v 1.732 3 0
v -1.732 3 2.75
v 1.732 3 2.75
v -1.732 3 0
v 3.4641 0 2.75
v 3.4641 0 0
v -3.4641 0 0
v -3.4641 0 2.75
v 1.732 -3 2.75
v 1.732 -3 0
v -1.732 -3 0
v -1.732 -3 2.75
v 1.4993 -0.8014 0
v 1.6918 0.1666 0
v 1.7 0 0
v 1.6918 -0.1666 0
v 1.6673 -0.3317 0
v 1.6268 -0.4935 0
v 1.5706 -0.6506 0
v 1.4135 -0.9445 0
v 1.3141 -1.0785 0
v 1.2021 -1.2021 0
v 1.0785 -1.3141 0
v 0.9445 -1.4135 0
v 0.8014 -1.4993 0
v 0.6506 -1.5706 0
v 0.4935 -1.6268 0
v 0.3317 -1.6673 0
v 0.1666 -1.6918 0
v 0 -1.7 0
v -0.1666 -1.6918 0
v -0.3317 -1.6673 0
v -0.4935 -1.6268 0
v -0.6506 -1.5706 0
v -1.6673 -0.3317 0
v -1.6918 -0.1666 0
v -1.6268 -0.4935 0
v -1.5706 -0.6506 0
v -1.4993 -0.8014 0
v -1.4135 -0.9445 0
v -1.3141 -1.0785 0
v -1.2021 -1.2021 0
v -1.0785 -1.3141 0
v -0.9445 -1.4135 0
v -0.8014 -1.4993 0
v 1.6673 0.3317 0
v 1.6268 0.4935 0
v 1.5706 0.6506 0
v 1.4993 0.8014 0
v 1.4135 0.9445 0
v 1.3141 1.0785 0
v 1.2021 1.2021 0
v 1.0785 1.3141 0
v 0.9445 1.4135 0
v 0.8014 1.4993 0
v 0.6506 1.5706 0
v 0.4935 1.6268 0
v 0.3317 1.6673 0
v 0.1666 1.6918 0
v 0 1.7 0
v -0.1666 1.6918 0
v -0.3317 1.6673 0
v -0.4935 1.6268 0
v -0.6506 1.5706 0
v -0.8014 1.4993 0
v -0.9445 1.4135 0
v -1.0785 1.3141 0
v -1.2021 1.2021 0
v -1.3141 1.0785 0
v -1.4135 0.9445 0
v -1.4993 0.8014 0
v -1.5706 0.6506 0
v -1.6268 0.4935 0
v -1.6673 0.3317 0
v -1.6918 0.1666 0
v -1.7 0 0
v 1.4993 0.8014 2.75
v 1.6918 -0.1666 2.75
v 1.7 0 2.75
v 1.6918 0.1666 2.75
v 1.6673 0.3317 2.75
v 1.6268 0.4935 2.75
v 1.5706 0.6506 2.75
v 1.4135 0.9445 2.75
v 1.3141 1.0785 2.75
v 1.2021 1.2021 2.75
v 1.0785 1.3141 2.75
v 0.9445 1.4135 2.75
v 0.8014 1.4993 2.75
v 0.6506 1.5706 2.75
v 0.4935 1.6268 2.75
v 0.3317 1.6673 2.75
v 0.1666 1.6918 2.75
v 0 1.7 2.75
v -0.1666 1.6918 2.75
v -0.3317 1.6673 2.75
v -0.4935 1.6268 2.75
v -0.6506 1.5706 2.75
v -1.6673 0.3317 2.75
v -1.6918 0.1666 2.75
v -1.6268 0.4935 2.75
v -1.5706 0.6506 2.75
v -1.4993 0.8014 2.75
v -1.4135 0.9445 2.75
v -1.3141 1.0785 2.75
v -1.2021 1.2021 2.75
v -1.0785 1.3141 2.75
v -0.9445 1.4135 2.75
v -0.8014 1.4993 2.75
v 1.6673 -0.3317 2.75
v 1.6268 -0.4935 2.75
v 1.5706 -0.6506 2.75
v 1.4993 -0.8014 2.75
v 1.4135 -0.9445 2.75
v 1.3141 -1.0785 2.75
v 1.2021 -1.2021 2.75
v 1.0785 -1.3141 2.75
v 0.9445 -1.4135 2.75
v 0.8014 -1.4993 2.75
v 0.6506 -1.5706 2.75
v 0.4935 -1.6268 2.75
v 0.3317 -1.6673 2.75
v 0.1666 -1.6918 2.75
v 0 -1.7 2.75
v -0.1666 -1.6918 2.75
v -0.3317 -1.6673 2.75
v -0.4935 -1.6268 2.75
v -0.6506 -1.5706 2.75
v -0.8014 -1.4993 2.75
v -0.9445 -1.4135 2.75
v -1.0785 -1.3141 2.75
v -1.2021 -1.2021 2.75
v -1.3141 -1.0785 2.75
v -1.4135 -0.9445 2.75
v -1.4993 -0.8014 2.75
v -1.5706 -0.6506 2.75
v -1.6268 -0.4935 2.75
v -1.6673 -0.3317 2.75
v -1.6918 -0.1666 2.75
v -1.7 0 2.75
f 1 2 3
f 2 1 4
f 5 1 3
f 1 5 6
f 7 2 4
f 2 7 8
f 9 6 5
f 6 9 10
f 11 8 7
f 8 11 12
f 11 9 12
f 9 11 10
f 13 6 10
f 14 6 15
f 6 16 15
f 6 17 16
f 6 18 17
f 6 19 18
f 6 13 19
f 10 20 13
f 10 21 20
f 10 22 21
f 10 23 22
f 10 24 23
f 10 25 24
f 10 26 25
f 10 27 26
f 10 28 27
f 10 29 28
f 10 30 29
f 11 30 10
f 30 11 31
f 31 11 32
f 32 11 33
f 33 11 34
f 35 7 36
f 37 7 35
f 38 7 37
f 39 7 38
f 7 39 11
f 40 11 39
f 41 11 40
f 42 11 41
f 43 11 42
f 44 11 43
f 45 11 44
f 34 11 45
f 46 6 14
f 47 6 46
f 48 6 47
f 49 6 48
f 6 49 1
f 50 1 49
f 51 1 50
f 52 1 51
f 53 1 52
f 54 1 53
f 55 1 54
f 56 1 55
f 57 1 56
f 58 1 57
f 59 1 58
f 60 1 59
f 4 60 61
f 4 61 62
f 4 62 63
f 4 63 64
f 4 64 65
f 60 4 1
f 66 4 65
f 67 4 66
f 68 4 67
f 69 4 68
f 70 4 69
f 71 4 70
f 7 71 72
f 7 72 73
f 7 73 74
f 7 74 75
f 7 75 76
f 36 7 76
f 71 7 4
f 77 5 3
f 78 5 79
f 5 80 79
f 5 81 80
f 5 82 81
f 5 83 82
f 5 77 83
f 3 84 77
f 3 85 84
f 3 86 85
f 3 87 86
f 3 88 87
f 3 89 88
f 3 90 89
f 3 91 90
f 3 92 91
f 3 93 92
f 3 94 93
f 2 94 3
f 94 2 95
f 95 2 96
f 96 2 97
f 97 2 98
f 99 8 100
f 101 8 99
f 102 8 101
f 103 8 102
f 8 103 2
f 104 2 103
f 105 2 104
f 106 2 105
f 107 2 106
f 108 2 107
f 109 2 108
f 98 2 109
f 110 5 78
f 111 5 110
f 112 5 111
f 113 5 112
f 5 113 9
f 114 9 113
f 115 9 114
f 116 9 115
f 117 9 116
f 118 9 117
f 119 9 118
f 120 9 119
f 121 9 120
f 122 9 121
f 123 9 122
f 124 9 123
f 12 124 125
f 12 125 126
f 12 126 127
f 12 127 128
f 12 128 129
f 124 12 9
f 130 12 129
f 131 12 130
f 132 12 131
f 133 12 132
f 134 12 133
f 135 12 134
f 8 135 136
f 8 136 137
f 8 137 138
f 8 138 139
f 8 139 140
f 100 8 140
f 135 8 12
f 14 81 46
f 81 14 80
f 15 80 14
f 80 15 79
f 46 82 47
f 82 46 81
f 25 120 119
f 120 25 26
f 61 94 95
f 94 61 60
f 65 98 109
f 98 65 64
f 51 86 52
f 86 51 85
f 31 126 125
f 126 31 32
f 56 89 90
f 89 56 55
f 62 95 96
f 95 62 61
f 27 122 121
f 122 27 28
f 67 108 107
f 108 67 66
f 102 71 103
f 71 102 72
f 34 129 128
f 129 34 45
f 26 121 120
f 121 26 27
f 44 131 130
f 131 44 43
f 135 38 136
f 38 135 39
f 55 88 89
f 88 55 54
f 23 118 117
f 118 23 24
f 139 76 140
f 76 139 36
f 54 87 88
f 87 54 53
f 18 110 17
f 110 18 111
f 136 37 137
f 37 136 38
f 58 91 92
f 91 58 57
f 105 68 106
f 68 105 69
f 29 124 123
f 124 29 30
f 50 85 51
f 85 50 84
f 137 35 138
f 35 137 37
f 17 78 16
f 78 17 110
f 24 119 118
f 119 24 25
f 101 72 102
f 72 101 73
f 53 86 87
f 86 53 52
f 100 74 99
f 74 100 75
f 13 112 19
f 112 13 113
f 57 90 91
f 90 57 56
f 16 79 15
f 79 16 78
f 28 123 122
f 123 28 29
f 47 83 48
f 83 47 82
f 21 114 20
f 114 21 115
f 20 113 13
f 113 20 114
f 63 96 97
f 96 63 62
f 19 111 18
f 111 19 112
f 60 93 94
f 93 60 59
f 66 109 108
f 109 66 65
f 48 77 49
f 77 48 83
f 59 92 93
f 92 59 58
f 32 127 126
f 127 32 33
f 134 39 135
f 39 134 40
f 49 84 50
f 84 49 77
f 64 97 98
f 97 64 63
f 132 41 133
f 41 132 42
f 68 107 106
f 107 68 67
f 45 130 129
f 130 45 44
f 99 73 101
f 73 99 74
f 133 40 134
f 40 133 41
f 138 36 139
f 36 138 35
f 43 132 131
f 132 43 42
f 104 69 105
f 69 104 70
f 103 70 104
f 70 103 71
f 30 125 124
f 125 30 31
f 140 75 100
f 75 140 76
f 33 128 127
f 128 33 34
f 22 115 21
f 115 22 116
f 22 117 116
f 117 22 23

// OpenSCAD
$fn = 64;

// T-slot nut parameters (mm)
screw_d = 3.0;          // clearance for M3 screw
across_flats = 6.0;     // hex across flats
thickness = 2.75;       // nut thickness

// Derived
hex_R = across_flats / sqrt(3); // circumradius for hex with given across-flats
hole_d = screw_d + 0.4;         // typical clearance

module hex_prism(af, h){
    R = af / sqrt(3);
    linear_extrude(height=h)
        polygon([ for(i=[0:5]) [ R*cos(60*i), R*sin(60*i) ] ]);
}

difference(){
    hex_prism(across_flats, thickness);
    translate([0,0,-0.2])
        cylinder(d=hole_d, h=thickness+0.4);
}
